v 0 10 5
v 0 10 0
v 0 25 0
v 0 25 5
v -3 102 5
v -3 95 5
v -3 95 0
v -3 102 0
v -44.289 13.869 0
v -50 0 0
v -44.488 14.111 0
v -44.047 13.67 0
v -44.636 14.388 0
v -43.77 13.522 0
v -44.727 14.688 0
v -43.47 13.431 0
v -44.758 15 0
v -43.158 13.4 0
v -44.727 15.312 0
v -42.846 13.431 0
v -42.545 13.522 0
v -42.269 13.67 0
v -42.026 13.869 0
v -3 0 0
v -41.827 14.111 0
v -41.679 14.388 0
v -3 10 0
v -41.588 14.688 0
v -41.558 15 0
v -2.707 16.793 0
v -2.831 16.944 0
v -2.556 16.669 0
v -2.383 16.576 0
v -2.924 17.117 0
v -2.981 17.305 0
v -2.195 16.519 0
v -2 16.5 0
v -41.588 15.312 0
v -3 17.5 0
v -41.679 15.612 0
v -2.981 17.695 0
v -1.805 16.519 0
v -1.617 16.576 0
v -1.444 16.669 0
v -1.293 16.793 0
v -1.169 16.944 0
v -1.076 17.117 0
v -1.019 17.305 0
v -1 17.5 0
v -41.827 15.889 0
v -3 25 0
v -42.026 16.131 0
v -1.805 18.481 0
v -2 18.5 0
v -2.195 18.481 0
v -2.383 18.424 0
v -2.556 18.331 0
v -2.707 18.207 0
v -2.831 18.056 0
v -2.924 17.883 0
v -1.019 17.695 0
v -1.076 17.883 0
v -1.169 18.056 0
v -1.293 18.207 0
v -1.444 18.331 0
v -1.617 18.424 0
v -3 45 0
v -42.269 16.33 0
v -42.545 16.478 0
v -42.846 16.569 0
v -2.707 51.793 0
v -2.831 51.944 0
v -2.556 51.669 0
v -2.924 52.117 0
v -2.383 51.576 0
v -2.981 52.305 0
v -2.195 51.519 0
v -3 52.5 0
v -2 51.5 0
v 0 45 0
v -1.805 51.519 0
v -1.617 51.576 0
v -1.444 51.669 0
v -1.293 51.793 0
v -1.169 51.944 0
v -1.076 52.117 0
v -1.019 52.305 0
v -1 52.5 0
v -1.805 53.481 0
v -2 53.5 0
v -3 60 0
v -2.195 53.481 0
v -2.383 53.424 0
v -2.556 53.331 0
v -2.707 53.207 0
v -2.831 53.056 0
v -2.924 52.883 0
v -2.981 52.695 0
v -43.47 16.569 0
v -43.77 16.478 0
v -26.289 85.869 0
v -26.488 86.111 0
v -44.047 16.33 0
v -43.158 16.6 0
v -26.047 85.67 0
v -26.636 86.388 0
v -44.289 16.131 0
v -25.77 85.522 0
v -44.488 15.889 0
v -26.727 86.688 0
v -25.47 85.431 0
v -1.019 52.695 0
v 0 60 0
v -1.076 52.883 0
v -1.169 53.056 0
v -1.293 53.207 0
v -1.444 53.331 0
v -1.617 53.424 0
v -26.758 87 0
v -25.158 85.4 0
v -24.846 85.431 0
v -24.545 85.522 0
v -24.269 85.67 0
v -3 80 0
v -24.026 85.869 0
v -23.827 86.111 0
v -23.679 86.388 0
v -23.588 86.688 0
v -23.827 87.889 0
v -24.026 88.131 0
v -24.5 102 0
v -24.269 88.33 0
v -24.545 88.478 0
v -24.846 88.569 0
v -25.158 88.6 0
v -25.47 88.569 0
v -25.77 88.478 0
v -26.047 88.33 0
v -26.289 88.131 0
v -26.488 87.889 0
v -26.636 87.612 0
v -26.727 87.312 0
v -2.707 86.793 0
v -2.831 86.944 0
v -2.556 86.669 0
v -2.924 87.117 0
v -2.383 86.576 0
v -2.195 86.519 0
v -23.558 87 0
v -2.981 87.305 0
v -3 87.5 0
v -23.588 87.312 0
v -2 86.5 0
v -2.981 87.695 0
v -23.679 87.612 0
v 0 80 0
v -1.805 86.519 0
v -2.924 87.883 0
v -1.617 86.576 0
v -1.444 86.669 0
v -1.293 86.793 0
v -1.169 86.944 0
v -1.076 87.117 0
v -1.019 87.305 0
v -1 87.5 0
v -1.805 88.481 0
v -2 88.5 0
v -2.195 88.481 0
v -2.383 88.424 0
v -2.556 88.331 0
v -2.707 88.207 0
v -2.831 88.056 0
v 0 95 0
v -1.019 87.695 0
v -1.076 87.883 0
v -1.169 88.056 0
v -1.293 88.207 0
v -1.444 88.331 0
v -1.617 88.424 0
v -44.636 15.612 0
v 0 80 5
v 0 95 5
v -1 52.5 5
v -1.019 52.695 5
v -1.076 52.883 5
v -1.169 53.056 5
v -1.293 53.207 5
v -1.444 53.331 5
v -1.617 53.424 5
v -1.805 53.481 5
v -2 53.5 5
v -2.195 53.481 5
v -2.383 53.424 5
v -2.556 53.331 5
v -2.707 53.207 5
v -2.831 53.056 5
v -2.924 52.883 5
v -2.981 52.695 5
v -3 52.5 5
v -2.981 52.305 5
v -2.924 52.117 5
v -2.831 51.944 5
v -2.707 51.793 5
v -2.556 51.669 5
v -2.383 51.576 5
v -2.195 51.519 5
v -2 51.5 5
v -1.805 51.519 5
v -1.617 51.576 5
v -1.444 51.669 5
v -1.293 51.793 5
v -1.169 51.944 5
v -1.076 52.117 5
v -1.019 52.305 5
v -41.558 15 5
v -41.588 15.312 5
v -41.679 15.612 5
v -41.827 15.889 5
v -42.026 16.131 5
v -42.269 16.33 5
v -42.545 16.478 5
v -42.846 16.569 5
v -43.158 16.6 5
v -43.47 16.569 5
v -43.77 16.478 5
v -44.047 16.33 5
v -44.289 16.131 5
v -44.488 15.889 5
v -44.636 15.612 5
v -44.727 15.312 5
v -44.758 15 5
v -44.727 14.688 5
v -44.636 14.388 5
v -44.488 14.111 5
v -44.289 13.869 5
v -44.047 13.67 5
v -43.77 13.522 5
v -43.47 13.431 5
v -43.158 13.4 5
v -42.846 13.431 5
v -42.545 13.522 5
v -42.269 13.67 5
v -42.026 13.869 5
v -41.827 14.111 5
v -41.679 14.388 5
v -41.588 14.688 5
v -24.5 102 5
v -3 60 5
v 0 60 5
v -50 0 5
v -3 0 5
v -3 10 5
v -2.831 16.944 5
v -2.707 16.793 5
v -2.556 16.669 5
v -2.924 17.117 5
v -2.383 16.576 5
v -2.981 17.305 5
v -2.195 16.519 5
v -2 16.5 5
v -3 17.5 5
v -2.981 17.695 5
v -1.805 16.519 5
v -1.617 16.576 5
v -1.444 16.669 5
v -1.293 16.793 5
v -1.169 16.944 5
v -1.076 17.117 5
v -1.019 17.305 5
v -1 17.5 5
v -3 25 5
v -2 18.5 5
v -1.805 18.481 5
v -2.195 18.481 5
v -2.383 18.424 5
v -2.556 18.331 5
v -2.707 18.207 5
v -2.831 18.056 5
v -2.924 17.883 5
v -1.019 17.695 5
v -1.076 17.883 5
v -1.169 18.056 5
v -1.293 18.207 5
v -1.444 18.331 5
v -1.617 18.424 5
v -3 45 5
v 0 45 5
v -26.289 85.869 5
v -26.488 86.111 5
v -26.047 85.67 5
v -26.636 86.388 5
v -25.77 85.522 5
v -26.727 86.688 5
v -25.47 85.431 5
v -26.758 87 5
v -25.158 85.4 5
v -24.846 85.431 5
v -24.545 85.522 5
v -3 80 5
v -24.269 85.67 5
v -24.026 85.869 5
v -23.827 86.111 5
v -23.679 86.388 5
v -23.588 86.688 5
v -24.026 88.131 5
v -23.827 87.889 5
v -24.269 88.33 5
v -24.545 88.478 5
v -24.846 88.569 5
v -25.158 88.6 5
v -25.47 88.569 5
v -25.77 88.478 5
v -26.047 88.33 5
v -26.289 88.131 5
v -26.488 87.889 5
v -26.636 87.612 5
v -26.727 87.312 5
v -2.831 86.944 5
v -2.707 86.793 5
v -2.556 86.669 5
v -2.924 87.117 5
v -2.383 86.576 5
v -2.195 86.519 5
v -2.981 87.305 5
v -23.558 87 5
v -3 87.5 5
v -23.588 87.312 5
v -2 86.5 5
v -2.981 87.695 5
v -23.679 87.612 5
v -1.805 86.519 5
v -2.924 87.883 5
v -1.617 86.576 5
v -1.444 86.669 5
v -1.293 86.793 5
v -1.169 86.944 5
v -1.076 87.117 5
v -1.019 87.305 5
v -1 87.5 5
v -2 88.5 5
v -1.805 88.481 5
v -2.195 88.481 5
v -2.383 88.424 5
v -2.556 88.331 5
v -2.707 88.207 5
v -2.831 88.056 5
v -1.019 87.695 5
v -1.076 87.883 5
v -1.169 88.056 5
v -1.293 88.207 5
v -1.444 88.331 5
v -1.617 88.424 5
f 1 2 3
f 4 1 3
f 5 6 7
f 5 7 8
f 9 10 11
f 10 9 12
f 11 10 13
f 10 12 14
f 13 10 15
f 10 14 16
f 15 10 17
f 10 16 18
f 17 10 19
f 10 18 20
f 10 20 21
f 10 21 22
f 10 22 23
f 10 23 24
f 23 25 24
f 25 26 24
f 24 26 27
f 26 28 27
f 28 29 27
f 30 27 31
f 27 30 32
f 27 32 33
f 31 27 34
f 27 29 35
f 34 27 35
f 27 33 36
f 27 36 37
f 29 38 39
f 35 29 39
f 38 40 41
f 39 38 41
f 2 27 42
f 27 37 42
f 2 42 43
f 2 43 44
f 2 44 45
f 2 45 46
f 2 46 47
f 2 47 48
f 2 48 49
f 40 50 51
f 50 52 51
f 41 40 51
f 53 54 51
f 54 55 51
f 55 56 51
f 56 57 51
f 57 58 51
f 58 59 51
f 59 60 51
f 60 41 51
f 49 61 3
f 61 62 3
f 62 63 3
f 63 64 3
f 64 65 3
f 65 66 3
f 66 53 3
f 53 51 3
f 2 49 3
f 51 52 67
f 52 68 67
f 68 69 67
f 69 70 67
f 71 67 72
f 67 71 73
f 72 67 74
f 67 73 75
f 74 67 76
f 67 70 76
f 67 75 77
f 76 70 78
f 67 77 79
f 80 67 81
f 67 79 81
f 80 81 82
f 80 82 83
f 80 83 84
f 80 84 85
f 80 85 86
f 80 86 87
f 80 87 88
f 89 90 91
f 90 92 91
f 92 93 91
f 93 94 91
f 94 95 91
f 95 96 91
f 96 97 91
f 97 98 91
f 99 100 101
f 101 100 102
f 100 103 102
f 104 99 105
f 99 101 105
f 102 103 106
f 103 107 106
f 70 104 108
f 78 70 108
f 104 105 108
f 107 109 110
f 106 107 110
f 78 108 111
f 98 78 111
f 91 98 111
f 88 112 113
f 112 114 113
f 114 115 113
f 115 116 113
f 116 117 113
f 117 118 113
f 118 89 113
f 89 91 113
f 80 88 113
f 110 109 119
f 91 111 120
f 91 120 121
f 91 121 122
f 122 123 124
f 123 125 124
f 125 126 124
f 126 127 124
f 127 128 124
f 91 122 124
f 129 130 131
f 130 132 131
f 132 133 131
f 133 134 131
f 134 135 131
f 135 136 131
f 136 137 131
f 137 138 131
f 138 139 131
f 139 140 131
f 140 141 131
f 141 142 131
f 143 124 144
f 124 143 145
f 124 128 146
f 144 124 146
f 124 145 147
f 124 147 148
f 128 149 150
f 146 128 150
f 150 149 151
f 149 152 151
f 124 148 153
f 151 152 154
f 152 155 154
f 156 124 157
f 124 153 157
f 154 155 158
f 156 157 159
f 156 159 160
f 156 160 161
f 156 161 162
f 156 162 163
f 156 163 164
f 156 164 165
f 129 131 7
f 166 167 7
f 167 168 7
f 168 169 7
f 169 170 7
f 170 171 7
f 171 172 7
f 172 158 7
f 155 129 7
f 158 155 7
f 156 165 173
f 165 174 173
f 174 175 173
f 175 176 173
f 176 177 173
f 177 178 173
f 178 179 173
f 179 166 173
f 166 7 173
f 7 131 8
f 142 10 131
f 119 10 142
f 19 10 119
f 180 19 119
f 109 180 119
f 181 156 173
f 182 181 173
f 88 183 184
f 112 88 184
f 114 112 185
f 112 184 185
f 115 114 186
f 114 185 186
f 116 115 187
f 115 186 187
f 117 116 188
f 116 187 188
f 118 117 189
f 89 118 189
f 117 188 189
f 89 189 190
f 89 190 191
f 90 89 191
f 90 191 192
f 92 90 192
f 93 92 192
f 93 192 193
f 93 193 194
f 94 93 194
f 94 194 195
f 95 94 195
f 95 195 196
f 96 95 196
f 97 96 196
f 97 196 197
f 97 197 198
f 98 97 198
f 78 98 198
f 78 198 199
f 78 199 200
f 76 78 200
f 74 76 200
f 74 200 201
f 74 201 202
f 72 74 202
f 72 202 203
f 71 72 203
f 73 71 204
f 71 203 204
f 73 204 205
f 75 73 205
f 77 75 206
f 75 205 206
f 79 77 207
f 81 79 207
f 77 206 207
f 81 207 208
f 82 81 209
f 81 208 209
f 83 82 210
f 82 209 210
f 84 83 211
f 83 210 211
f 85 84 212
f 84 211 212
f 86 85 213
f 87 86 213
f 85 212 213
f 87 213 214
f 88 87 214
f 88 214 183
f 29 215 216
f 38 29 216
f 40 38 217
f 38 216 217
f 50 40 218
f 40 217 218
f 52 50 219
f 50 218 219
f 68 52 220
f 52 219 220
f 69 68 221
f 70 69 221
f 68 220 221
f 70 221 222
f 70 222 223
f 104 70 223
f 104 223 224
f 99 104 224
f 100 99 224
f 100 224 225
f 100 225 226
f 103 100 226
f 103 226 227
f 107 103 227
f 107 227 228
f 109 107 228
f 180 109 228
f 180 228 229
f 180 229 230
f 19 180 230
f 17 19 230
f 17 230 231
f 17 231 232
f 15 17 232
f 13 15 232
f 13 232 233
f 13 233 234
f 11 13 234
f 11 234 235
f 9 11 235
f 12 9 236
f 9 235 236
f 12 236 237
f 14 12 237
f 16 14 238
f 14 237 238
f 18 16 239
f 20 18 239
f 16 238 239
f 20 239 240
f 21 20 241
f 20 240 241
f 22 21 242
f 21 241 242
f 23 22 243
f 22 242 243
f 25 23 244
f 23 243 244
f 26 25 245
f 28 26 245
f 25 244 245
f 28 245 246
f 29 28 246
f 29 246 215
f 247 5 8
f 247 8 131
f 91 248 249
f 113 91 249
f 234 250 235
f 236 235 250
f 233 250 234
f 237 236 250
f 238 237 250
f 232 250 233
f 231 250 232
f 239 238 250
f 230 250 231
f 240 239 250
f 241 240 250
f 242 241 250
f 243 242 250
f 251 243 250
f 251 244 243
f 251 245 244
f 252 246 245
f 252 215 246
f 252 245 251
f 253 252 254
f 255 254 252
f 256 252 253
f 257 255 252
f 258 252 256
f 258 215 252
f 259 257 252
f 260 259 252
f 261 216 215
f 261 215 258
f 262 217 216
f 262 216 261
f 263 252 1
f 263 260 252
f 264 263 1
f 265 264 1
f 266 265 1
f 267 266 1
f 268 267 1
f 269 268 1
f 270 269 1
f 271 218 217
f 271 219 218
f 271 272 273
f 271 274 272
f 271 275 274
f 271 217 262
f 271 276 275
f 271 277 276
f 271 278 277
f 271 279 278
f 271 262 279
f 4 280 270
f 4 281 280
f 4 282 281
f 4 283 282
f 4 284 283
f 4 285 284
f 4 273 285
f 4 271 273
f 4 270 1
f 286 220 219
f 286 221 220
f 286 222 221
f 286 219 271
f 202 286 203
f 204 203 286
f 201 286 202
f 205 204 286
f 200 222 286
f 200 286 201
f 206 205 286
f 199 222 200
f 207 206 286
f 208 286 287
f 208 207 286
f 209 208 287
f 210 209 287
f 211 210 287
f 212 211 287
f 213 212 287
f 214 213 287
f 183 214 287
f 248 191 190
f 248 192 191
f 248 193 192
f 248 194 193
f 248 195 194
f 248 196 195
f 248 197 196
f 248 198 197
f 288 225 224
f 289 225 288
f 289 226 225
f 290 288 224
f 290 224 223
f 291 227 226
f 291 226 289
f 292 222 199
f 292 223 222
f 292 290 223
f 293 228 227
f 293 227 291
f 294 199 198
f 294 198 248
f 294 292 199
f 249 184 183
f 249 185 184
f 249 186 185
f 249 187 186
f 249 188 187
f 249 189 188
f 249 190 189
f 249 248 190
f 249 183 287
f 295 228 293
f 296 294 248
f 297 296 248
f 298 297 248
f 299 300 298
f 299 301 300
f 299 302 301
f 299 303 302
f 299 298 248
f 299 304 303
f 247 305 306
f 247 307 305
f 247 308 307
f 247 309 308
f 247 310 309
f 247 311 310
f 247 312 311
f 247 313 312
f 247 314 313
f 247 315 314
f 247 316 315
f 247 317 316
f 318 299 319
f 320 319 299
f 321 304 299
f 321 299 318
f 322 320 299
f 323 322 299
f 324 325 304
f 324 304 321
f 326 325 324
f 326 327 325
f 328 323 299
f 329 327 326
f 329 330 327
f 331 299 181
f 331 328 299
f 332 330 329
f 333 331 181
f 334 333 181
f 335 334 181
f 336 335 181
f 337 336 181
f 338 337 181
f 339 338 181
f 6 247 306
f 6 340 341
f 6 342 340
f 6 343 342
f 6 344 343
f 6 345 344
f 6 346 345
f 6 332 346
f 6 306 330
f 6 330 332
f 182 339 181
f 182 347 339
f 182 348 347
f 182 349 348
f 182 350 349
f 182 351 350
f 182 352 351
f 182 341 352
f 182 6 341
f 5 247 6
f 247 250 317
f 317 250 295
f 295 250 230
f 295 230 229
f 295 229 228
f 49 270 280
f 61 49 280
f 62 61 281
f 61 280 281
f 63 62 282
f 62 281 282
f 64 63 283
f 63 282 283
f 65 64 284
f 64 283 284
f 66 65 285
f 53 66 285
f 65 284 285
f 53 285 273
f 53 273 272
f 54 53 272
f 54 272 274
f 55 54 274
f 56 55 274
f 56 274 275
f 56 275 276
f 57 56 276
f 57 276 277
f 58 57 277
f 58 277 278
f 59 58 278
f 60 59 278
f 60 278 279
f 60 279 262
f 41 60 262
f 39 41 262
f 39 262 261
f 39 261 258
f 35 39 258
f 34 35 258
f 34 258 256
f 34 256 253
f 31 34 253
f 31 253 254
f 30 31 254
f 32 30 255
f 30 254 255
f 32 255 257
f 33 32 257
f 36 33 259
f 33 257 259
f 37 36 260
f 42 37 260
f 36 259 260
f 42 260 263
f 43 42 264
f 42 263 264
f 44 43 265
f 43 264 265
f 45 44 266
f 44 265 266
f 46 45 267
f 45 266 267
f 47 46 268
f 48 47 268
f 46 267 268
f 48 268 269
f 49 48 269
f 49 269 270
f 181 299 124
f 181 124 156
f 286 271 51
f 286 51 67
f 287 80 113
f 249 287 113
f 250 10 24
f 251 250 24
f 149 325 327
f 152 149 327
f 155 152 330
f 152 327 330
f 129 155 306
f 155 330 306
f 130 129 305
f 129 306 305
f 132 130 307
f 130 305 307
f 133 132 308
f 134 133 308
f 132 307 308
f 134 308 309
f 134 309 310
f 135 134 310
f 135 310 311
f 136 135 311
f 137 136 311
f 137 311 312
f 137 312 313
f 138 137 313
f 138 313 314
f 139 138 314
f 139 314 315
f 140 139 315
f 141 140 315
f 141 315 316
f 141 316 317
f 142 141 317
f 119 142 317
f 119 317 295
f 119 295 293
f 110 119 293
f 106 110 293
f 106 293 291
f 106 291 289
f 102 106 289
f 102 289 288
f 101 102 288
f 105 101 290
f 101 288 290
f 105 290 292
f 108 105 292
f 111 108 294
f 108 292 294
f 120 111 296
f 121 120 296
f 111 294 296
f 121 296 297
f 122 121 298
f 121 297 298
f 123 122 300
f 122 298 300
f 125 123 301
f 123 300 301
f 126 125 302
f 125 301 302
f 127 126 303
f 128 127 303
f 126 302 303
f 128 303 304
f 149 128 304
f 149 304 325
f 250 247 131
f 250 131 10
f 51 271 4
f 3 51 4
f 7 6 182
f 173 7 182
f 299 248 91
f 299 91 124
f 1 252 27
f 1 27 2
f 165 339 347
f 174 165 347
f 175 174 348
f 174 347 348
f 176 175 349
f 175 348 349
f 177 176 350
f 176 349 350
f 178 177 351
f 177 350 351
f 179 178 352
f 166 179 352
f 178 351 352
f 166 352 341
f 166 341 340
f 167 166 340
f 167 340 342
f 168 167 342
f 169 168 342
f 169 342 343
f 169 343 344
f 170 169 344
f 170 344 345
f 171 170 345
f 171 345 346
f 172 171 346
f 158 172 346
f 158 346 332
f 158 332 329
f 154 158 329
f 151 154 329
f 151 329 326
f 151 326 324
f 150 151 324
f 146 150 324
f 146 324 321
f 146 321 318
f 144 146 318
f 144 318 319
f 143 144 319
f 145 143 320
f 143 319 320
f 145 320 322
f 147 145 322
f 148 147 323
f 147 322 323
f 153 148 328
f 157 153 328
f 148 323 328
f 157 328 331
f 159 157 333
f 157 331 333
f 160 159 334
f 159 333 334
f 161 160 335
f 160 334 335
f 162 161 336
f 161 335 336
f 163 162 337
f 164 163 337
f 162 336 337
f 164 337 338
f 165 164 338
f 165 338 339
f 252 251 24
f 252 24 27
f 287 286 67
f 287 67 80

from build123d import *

# Parameters (mm, degrees)
EXTRUDE_1_DEPTH     = 5
SKETCH_2_W          = 3
SKETCH_2_H          = 10
SKETCH_2_H_2        = 20
SKETCH_2_H_3        = 12.022353437
CUT_EXTRUDE_1_DEPTH = 112.915146428
EXTRUDE_2_DEPTH     = 5
SKETCH_4_R          = 1.6
CUT_EXTRUDE_2_DEPTH = 114.705760628
SKETCH_5_R          = 1
CUT_EXTRUDE_3_DEPTH = 114.705760628


with BuildPart() as part:
    # 草图1 → 凸台-拉伸1 (new body)
    with BuildSketch(Plane.XY):
        Polygon((0, 0), (0, 100), (-25, 100), (-50, 0), align=None)
    extrude(amount=EXTRUDE_1_DEPTH)

    # 草图2 → 切除-拉伸1 (cut, through all)
    with BuildSketch(Plane.XY.offset(5)):
        with Locations((-1.5, 5)):
            Rectangle(SKETCH_2_W, SKETCH_2_H)
        with Locations((-1.5, 35)):
            Rectangle(SKETCH_2_W, SKETCH_2_H_2)
        with Locations((-1.5, 70)):
            Rectangle(SKETCH_2_W, SKETCH_2_H_2)
        with Locations((-1.5, 101.011176718)):
            Rectangle(SKETCH_2_W, SKETCH_2_H_3)
    extrude(amount=-CUT_EXTRUDE_1_DEPTH, mode=Mode.SUBTRACT)

    # 草图3 → 凸台-拉伸2 (add)
    with BuildSketch(Plane.XY.offset(5)):
        Polygon((-3, 100), (-3, 102), (-24.5, 102), (-25, 100), align=None)
    extrude(amount=-EXTRUDE_2_DEPTH)

    # 草图4 → 切除-拉伸2 (cut, through all)
    with BuildSketch(Plane.XY.offset(5)):
        with Locations((-25.157670781, 87)):
            Circle(SKETCH_4_R)
        with Locations((-43.157670781, 15)):
            Circle(SKETCH_4_R)
    extrude(amount=-CUT_EXTRUDE_2_DEPTH, mode=Mode.SUBTRACT)

    # 草图5 → 切除-拉伸3 (cut, through all)
    with BuildSketch(Plane.XY.offset(5)):
        with Locations((-2, 87.5)):
            Circle(SKETCH_5_R)
        with Locations((-2, 52.5)):
            Circle(SKETCH_5_R)
        with Locations((-2, 17.5)):
            Circle(SKETCH_5_R)
    extrude(amount=-CUT_EXTRUDE_3_DEPTH, mode=Mode.SUBTRACT)


solid = part.part
